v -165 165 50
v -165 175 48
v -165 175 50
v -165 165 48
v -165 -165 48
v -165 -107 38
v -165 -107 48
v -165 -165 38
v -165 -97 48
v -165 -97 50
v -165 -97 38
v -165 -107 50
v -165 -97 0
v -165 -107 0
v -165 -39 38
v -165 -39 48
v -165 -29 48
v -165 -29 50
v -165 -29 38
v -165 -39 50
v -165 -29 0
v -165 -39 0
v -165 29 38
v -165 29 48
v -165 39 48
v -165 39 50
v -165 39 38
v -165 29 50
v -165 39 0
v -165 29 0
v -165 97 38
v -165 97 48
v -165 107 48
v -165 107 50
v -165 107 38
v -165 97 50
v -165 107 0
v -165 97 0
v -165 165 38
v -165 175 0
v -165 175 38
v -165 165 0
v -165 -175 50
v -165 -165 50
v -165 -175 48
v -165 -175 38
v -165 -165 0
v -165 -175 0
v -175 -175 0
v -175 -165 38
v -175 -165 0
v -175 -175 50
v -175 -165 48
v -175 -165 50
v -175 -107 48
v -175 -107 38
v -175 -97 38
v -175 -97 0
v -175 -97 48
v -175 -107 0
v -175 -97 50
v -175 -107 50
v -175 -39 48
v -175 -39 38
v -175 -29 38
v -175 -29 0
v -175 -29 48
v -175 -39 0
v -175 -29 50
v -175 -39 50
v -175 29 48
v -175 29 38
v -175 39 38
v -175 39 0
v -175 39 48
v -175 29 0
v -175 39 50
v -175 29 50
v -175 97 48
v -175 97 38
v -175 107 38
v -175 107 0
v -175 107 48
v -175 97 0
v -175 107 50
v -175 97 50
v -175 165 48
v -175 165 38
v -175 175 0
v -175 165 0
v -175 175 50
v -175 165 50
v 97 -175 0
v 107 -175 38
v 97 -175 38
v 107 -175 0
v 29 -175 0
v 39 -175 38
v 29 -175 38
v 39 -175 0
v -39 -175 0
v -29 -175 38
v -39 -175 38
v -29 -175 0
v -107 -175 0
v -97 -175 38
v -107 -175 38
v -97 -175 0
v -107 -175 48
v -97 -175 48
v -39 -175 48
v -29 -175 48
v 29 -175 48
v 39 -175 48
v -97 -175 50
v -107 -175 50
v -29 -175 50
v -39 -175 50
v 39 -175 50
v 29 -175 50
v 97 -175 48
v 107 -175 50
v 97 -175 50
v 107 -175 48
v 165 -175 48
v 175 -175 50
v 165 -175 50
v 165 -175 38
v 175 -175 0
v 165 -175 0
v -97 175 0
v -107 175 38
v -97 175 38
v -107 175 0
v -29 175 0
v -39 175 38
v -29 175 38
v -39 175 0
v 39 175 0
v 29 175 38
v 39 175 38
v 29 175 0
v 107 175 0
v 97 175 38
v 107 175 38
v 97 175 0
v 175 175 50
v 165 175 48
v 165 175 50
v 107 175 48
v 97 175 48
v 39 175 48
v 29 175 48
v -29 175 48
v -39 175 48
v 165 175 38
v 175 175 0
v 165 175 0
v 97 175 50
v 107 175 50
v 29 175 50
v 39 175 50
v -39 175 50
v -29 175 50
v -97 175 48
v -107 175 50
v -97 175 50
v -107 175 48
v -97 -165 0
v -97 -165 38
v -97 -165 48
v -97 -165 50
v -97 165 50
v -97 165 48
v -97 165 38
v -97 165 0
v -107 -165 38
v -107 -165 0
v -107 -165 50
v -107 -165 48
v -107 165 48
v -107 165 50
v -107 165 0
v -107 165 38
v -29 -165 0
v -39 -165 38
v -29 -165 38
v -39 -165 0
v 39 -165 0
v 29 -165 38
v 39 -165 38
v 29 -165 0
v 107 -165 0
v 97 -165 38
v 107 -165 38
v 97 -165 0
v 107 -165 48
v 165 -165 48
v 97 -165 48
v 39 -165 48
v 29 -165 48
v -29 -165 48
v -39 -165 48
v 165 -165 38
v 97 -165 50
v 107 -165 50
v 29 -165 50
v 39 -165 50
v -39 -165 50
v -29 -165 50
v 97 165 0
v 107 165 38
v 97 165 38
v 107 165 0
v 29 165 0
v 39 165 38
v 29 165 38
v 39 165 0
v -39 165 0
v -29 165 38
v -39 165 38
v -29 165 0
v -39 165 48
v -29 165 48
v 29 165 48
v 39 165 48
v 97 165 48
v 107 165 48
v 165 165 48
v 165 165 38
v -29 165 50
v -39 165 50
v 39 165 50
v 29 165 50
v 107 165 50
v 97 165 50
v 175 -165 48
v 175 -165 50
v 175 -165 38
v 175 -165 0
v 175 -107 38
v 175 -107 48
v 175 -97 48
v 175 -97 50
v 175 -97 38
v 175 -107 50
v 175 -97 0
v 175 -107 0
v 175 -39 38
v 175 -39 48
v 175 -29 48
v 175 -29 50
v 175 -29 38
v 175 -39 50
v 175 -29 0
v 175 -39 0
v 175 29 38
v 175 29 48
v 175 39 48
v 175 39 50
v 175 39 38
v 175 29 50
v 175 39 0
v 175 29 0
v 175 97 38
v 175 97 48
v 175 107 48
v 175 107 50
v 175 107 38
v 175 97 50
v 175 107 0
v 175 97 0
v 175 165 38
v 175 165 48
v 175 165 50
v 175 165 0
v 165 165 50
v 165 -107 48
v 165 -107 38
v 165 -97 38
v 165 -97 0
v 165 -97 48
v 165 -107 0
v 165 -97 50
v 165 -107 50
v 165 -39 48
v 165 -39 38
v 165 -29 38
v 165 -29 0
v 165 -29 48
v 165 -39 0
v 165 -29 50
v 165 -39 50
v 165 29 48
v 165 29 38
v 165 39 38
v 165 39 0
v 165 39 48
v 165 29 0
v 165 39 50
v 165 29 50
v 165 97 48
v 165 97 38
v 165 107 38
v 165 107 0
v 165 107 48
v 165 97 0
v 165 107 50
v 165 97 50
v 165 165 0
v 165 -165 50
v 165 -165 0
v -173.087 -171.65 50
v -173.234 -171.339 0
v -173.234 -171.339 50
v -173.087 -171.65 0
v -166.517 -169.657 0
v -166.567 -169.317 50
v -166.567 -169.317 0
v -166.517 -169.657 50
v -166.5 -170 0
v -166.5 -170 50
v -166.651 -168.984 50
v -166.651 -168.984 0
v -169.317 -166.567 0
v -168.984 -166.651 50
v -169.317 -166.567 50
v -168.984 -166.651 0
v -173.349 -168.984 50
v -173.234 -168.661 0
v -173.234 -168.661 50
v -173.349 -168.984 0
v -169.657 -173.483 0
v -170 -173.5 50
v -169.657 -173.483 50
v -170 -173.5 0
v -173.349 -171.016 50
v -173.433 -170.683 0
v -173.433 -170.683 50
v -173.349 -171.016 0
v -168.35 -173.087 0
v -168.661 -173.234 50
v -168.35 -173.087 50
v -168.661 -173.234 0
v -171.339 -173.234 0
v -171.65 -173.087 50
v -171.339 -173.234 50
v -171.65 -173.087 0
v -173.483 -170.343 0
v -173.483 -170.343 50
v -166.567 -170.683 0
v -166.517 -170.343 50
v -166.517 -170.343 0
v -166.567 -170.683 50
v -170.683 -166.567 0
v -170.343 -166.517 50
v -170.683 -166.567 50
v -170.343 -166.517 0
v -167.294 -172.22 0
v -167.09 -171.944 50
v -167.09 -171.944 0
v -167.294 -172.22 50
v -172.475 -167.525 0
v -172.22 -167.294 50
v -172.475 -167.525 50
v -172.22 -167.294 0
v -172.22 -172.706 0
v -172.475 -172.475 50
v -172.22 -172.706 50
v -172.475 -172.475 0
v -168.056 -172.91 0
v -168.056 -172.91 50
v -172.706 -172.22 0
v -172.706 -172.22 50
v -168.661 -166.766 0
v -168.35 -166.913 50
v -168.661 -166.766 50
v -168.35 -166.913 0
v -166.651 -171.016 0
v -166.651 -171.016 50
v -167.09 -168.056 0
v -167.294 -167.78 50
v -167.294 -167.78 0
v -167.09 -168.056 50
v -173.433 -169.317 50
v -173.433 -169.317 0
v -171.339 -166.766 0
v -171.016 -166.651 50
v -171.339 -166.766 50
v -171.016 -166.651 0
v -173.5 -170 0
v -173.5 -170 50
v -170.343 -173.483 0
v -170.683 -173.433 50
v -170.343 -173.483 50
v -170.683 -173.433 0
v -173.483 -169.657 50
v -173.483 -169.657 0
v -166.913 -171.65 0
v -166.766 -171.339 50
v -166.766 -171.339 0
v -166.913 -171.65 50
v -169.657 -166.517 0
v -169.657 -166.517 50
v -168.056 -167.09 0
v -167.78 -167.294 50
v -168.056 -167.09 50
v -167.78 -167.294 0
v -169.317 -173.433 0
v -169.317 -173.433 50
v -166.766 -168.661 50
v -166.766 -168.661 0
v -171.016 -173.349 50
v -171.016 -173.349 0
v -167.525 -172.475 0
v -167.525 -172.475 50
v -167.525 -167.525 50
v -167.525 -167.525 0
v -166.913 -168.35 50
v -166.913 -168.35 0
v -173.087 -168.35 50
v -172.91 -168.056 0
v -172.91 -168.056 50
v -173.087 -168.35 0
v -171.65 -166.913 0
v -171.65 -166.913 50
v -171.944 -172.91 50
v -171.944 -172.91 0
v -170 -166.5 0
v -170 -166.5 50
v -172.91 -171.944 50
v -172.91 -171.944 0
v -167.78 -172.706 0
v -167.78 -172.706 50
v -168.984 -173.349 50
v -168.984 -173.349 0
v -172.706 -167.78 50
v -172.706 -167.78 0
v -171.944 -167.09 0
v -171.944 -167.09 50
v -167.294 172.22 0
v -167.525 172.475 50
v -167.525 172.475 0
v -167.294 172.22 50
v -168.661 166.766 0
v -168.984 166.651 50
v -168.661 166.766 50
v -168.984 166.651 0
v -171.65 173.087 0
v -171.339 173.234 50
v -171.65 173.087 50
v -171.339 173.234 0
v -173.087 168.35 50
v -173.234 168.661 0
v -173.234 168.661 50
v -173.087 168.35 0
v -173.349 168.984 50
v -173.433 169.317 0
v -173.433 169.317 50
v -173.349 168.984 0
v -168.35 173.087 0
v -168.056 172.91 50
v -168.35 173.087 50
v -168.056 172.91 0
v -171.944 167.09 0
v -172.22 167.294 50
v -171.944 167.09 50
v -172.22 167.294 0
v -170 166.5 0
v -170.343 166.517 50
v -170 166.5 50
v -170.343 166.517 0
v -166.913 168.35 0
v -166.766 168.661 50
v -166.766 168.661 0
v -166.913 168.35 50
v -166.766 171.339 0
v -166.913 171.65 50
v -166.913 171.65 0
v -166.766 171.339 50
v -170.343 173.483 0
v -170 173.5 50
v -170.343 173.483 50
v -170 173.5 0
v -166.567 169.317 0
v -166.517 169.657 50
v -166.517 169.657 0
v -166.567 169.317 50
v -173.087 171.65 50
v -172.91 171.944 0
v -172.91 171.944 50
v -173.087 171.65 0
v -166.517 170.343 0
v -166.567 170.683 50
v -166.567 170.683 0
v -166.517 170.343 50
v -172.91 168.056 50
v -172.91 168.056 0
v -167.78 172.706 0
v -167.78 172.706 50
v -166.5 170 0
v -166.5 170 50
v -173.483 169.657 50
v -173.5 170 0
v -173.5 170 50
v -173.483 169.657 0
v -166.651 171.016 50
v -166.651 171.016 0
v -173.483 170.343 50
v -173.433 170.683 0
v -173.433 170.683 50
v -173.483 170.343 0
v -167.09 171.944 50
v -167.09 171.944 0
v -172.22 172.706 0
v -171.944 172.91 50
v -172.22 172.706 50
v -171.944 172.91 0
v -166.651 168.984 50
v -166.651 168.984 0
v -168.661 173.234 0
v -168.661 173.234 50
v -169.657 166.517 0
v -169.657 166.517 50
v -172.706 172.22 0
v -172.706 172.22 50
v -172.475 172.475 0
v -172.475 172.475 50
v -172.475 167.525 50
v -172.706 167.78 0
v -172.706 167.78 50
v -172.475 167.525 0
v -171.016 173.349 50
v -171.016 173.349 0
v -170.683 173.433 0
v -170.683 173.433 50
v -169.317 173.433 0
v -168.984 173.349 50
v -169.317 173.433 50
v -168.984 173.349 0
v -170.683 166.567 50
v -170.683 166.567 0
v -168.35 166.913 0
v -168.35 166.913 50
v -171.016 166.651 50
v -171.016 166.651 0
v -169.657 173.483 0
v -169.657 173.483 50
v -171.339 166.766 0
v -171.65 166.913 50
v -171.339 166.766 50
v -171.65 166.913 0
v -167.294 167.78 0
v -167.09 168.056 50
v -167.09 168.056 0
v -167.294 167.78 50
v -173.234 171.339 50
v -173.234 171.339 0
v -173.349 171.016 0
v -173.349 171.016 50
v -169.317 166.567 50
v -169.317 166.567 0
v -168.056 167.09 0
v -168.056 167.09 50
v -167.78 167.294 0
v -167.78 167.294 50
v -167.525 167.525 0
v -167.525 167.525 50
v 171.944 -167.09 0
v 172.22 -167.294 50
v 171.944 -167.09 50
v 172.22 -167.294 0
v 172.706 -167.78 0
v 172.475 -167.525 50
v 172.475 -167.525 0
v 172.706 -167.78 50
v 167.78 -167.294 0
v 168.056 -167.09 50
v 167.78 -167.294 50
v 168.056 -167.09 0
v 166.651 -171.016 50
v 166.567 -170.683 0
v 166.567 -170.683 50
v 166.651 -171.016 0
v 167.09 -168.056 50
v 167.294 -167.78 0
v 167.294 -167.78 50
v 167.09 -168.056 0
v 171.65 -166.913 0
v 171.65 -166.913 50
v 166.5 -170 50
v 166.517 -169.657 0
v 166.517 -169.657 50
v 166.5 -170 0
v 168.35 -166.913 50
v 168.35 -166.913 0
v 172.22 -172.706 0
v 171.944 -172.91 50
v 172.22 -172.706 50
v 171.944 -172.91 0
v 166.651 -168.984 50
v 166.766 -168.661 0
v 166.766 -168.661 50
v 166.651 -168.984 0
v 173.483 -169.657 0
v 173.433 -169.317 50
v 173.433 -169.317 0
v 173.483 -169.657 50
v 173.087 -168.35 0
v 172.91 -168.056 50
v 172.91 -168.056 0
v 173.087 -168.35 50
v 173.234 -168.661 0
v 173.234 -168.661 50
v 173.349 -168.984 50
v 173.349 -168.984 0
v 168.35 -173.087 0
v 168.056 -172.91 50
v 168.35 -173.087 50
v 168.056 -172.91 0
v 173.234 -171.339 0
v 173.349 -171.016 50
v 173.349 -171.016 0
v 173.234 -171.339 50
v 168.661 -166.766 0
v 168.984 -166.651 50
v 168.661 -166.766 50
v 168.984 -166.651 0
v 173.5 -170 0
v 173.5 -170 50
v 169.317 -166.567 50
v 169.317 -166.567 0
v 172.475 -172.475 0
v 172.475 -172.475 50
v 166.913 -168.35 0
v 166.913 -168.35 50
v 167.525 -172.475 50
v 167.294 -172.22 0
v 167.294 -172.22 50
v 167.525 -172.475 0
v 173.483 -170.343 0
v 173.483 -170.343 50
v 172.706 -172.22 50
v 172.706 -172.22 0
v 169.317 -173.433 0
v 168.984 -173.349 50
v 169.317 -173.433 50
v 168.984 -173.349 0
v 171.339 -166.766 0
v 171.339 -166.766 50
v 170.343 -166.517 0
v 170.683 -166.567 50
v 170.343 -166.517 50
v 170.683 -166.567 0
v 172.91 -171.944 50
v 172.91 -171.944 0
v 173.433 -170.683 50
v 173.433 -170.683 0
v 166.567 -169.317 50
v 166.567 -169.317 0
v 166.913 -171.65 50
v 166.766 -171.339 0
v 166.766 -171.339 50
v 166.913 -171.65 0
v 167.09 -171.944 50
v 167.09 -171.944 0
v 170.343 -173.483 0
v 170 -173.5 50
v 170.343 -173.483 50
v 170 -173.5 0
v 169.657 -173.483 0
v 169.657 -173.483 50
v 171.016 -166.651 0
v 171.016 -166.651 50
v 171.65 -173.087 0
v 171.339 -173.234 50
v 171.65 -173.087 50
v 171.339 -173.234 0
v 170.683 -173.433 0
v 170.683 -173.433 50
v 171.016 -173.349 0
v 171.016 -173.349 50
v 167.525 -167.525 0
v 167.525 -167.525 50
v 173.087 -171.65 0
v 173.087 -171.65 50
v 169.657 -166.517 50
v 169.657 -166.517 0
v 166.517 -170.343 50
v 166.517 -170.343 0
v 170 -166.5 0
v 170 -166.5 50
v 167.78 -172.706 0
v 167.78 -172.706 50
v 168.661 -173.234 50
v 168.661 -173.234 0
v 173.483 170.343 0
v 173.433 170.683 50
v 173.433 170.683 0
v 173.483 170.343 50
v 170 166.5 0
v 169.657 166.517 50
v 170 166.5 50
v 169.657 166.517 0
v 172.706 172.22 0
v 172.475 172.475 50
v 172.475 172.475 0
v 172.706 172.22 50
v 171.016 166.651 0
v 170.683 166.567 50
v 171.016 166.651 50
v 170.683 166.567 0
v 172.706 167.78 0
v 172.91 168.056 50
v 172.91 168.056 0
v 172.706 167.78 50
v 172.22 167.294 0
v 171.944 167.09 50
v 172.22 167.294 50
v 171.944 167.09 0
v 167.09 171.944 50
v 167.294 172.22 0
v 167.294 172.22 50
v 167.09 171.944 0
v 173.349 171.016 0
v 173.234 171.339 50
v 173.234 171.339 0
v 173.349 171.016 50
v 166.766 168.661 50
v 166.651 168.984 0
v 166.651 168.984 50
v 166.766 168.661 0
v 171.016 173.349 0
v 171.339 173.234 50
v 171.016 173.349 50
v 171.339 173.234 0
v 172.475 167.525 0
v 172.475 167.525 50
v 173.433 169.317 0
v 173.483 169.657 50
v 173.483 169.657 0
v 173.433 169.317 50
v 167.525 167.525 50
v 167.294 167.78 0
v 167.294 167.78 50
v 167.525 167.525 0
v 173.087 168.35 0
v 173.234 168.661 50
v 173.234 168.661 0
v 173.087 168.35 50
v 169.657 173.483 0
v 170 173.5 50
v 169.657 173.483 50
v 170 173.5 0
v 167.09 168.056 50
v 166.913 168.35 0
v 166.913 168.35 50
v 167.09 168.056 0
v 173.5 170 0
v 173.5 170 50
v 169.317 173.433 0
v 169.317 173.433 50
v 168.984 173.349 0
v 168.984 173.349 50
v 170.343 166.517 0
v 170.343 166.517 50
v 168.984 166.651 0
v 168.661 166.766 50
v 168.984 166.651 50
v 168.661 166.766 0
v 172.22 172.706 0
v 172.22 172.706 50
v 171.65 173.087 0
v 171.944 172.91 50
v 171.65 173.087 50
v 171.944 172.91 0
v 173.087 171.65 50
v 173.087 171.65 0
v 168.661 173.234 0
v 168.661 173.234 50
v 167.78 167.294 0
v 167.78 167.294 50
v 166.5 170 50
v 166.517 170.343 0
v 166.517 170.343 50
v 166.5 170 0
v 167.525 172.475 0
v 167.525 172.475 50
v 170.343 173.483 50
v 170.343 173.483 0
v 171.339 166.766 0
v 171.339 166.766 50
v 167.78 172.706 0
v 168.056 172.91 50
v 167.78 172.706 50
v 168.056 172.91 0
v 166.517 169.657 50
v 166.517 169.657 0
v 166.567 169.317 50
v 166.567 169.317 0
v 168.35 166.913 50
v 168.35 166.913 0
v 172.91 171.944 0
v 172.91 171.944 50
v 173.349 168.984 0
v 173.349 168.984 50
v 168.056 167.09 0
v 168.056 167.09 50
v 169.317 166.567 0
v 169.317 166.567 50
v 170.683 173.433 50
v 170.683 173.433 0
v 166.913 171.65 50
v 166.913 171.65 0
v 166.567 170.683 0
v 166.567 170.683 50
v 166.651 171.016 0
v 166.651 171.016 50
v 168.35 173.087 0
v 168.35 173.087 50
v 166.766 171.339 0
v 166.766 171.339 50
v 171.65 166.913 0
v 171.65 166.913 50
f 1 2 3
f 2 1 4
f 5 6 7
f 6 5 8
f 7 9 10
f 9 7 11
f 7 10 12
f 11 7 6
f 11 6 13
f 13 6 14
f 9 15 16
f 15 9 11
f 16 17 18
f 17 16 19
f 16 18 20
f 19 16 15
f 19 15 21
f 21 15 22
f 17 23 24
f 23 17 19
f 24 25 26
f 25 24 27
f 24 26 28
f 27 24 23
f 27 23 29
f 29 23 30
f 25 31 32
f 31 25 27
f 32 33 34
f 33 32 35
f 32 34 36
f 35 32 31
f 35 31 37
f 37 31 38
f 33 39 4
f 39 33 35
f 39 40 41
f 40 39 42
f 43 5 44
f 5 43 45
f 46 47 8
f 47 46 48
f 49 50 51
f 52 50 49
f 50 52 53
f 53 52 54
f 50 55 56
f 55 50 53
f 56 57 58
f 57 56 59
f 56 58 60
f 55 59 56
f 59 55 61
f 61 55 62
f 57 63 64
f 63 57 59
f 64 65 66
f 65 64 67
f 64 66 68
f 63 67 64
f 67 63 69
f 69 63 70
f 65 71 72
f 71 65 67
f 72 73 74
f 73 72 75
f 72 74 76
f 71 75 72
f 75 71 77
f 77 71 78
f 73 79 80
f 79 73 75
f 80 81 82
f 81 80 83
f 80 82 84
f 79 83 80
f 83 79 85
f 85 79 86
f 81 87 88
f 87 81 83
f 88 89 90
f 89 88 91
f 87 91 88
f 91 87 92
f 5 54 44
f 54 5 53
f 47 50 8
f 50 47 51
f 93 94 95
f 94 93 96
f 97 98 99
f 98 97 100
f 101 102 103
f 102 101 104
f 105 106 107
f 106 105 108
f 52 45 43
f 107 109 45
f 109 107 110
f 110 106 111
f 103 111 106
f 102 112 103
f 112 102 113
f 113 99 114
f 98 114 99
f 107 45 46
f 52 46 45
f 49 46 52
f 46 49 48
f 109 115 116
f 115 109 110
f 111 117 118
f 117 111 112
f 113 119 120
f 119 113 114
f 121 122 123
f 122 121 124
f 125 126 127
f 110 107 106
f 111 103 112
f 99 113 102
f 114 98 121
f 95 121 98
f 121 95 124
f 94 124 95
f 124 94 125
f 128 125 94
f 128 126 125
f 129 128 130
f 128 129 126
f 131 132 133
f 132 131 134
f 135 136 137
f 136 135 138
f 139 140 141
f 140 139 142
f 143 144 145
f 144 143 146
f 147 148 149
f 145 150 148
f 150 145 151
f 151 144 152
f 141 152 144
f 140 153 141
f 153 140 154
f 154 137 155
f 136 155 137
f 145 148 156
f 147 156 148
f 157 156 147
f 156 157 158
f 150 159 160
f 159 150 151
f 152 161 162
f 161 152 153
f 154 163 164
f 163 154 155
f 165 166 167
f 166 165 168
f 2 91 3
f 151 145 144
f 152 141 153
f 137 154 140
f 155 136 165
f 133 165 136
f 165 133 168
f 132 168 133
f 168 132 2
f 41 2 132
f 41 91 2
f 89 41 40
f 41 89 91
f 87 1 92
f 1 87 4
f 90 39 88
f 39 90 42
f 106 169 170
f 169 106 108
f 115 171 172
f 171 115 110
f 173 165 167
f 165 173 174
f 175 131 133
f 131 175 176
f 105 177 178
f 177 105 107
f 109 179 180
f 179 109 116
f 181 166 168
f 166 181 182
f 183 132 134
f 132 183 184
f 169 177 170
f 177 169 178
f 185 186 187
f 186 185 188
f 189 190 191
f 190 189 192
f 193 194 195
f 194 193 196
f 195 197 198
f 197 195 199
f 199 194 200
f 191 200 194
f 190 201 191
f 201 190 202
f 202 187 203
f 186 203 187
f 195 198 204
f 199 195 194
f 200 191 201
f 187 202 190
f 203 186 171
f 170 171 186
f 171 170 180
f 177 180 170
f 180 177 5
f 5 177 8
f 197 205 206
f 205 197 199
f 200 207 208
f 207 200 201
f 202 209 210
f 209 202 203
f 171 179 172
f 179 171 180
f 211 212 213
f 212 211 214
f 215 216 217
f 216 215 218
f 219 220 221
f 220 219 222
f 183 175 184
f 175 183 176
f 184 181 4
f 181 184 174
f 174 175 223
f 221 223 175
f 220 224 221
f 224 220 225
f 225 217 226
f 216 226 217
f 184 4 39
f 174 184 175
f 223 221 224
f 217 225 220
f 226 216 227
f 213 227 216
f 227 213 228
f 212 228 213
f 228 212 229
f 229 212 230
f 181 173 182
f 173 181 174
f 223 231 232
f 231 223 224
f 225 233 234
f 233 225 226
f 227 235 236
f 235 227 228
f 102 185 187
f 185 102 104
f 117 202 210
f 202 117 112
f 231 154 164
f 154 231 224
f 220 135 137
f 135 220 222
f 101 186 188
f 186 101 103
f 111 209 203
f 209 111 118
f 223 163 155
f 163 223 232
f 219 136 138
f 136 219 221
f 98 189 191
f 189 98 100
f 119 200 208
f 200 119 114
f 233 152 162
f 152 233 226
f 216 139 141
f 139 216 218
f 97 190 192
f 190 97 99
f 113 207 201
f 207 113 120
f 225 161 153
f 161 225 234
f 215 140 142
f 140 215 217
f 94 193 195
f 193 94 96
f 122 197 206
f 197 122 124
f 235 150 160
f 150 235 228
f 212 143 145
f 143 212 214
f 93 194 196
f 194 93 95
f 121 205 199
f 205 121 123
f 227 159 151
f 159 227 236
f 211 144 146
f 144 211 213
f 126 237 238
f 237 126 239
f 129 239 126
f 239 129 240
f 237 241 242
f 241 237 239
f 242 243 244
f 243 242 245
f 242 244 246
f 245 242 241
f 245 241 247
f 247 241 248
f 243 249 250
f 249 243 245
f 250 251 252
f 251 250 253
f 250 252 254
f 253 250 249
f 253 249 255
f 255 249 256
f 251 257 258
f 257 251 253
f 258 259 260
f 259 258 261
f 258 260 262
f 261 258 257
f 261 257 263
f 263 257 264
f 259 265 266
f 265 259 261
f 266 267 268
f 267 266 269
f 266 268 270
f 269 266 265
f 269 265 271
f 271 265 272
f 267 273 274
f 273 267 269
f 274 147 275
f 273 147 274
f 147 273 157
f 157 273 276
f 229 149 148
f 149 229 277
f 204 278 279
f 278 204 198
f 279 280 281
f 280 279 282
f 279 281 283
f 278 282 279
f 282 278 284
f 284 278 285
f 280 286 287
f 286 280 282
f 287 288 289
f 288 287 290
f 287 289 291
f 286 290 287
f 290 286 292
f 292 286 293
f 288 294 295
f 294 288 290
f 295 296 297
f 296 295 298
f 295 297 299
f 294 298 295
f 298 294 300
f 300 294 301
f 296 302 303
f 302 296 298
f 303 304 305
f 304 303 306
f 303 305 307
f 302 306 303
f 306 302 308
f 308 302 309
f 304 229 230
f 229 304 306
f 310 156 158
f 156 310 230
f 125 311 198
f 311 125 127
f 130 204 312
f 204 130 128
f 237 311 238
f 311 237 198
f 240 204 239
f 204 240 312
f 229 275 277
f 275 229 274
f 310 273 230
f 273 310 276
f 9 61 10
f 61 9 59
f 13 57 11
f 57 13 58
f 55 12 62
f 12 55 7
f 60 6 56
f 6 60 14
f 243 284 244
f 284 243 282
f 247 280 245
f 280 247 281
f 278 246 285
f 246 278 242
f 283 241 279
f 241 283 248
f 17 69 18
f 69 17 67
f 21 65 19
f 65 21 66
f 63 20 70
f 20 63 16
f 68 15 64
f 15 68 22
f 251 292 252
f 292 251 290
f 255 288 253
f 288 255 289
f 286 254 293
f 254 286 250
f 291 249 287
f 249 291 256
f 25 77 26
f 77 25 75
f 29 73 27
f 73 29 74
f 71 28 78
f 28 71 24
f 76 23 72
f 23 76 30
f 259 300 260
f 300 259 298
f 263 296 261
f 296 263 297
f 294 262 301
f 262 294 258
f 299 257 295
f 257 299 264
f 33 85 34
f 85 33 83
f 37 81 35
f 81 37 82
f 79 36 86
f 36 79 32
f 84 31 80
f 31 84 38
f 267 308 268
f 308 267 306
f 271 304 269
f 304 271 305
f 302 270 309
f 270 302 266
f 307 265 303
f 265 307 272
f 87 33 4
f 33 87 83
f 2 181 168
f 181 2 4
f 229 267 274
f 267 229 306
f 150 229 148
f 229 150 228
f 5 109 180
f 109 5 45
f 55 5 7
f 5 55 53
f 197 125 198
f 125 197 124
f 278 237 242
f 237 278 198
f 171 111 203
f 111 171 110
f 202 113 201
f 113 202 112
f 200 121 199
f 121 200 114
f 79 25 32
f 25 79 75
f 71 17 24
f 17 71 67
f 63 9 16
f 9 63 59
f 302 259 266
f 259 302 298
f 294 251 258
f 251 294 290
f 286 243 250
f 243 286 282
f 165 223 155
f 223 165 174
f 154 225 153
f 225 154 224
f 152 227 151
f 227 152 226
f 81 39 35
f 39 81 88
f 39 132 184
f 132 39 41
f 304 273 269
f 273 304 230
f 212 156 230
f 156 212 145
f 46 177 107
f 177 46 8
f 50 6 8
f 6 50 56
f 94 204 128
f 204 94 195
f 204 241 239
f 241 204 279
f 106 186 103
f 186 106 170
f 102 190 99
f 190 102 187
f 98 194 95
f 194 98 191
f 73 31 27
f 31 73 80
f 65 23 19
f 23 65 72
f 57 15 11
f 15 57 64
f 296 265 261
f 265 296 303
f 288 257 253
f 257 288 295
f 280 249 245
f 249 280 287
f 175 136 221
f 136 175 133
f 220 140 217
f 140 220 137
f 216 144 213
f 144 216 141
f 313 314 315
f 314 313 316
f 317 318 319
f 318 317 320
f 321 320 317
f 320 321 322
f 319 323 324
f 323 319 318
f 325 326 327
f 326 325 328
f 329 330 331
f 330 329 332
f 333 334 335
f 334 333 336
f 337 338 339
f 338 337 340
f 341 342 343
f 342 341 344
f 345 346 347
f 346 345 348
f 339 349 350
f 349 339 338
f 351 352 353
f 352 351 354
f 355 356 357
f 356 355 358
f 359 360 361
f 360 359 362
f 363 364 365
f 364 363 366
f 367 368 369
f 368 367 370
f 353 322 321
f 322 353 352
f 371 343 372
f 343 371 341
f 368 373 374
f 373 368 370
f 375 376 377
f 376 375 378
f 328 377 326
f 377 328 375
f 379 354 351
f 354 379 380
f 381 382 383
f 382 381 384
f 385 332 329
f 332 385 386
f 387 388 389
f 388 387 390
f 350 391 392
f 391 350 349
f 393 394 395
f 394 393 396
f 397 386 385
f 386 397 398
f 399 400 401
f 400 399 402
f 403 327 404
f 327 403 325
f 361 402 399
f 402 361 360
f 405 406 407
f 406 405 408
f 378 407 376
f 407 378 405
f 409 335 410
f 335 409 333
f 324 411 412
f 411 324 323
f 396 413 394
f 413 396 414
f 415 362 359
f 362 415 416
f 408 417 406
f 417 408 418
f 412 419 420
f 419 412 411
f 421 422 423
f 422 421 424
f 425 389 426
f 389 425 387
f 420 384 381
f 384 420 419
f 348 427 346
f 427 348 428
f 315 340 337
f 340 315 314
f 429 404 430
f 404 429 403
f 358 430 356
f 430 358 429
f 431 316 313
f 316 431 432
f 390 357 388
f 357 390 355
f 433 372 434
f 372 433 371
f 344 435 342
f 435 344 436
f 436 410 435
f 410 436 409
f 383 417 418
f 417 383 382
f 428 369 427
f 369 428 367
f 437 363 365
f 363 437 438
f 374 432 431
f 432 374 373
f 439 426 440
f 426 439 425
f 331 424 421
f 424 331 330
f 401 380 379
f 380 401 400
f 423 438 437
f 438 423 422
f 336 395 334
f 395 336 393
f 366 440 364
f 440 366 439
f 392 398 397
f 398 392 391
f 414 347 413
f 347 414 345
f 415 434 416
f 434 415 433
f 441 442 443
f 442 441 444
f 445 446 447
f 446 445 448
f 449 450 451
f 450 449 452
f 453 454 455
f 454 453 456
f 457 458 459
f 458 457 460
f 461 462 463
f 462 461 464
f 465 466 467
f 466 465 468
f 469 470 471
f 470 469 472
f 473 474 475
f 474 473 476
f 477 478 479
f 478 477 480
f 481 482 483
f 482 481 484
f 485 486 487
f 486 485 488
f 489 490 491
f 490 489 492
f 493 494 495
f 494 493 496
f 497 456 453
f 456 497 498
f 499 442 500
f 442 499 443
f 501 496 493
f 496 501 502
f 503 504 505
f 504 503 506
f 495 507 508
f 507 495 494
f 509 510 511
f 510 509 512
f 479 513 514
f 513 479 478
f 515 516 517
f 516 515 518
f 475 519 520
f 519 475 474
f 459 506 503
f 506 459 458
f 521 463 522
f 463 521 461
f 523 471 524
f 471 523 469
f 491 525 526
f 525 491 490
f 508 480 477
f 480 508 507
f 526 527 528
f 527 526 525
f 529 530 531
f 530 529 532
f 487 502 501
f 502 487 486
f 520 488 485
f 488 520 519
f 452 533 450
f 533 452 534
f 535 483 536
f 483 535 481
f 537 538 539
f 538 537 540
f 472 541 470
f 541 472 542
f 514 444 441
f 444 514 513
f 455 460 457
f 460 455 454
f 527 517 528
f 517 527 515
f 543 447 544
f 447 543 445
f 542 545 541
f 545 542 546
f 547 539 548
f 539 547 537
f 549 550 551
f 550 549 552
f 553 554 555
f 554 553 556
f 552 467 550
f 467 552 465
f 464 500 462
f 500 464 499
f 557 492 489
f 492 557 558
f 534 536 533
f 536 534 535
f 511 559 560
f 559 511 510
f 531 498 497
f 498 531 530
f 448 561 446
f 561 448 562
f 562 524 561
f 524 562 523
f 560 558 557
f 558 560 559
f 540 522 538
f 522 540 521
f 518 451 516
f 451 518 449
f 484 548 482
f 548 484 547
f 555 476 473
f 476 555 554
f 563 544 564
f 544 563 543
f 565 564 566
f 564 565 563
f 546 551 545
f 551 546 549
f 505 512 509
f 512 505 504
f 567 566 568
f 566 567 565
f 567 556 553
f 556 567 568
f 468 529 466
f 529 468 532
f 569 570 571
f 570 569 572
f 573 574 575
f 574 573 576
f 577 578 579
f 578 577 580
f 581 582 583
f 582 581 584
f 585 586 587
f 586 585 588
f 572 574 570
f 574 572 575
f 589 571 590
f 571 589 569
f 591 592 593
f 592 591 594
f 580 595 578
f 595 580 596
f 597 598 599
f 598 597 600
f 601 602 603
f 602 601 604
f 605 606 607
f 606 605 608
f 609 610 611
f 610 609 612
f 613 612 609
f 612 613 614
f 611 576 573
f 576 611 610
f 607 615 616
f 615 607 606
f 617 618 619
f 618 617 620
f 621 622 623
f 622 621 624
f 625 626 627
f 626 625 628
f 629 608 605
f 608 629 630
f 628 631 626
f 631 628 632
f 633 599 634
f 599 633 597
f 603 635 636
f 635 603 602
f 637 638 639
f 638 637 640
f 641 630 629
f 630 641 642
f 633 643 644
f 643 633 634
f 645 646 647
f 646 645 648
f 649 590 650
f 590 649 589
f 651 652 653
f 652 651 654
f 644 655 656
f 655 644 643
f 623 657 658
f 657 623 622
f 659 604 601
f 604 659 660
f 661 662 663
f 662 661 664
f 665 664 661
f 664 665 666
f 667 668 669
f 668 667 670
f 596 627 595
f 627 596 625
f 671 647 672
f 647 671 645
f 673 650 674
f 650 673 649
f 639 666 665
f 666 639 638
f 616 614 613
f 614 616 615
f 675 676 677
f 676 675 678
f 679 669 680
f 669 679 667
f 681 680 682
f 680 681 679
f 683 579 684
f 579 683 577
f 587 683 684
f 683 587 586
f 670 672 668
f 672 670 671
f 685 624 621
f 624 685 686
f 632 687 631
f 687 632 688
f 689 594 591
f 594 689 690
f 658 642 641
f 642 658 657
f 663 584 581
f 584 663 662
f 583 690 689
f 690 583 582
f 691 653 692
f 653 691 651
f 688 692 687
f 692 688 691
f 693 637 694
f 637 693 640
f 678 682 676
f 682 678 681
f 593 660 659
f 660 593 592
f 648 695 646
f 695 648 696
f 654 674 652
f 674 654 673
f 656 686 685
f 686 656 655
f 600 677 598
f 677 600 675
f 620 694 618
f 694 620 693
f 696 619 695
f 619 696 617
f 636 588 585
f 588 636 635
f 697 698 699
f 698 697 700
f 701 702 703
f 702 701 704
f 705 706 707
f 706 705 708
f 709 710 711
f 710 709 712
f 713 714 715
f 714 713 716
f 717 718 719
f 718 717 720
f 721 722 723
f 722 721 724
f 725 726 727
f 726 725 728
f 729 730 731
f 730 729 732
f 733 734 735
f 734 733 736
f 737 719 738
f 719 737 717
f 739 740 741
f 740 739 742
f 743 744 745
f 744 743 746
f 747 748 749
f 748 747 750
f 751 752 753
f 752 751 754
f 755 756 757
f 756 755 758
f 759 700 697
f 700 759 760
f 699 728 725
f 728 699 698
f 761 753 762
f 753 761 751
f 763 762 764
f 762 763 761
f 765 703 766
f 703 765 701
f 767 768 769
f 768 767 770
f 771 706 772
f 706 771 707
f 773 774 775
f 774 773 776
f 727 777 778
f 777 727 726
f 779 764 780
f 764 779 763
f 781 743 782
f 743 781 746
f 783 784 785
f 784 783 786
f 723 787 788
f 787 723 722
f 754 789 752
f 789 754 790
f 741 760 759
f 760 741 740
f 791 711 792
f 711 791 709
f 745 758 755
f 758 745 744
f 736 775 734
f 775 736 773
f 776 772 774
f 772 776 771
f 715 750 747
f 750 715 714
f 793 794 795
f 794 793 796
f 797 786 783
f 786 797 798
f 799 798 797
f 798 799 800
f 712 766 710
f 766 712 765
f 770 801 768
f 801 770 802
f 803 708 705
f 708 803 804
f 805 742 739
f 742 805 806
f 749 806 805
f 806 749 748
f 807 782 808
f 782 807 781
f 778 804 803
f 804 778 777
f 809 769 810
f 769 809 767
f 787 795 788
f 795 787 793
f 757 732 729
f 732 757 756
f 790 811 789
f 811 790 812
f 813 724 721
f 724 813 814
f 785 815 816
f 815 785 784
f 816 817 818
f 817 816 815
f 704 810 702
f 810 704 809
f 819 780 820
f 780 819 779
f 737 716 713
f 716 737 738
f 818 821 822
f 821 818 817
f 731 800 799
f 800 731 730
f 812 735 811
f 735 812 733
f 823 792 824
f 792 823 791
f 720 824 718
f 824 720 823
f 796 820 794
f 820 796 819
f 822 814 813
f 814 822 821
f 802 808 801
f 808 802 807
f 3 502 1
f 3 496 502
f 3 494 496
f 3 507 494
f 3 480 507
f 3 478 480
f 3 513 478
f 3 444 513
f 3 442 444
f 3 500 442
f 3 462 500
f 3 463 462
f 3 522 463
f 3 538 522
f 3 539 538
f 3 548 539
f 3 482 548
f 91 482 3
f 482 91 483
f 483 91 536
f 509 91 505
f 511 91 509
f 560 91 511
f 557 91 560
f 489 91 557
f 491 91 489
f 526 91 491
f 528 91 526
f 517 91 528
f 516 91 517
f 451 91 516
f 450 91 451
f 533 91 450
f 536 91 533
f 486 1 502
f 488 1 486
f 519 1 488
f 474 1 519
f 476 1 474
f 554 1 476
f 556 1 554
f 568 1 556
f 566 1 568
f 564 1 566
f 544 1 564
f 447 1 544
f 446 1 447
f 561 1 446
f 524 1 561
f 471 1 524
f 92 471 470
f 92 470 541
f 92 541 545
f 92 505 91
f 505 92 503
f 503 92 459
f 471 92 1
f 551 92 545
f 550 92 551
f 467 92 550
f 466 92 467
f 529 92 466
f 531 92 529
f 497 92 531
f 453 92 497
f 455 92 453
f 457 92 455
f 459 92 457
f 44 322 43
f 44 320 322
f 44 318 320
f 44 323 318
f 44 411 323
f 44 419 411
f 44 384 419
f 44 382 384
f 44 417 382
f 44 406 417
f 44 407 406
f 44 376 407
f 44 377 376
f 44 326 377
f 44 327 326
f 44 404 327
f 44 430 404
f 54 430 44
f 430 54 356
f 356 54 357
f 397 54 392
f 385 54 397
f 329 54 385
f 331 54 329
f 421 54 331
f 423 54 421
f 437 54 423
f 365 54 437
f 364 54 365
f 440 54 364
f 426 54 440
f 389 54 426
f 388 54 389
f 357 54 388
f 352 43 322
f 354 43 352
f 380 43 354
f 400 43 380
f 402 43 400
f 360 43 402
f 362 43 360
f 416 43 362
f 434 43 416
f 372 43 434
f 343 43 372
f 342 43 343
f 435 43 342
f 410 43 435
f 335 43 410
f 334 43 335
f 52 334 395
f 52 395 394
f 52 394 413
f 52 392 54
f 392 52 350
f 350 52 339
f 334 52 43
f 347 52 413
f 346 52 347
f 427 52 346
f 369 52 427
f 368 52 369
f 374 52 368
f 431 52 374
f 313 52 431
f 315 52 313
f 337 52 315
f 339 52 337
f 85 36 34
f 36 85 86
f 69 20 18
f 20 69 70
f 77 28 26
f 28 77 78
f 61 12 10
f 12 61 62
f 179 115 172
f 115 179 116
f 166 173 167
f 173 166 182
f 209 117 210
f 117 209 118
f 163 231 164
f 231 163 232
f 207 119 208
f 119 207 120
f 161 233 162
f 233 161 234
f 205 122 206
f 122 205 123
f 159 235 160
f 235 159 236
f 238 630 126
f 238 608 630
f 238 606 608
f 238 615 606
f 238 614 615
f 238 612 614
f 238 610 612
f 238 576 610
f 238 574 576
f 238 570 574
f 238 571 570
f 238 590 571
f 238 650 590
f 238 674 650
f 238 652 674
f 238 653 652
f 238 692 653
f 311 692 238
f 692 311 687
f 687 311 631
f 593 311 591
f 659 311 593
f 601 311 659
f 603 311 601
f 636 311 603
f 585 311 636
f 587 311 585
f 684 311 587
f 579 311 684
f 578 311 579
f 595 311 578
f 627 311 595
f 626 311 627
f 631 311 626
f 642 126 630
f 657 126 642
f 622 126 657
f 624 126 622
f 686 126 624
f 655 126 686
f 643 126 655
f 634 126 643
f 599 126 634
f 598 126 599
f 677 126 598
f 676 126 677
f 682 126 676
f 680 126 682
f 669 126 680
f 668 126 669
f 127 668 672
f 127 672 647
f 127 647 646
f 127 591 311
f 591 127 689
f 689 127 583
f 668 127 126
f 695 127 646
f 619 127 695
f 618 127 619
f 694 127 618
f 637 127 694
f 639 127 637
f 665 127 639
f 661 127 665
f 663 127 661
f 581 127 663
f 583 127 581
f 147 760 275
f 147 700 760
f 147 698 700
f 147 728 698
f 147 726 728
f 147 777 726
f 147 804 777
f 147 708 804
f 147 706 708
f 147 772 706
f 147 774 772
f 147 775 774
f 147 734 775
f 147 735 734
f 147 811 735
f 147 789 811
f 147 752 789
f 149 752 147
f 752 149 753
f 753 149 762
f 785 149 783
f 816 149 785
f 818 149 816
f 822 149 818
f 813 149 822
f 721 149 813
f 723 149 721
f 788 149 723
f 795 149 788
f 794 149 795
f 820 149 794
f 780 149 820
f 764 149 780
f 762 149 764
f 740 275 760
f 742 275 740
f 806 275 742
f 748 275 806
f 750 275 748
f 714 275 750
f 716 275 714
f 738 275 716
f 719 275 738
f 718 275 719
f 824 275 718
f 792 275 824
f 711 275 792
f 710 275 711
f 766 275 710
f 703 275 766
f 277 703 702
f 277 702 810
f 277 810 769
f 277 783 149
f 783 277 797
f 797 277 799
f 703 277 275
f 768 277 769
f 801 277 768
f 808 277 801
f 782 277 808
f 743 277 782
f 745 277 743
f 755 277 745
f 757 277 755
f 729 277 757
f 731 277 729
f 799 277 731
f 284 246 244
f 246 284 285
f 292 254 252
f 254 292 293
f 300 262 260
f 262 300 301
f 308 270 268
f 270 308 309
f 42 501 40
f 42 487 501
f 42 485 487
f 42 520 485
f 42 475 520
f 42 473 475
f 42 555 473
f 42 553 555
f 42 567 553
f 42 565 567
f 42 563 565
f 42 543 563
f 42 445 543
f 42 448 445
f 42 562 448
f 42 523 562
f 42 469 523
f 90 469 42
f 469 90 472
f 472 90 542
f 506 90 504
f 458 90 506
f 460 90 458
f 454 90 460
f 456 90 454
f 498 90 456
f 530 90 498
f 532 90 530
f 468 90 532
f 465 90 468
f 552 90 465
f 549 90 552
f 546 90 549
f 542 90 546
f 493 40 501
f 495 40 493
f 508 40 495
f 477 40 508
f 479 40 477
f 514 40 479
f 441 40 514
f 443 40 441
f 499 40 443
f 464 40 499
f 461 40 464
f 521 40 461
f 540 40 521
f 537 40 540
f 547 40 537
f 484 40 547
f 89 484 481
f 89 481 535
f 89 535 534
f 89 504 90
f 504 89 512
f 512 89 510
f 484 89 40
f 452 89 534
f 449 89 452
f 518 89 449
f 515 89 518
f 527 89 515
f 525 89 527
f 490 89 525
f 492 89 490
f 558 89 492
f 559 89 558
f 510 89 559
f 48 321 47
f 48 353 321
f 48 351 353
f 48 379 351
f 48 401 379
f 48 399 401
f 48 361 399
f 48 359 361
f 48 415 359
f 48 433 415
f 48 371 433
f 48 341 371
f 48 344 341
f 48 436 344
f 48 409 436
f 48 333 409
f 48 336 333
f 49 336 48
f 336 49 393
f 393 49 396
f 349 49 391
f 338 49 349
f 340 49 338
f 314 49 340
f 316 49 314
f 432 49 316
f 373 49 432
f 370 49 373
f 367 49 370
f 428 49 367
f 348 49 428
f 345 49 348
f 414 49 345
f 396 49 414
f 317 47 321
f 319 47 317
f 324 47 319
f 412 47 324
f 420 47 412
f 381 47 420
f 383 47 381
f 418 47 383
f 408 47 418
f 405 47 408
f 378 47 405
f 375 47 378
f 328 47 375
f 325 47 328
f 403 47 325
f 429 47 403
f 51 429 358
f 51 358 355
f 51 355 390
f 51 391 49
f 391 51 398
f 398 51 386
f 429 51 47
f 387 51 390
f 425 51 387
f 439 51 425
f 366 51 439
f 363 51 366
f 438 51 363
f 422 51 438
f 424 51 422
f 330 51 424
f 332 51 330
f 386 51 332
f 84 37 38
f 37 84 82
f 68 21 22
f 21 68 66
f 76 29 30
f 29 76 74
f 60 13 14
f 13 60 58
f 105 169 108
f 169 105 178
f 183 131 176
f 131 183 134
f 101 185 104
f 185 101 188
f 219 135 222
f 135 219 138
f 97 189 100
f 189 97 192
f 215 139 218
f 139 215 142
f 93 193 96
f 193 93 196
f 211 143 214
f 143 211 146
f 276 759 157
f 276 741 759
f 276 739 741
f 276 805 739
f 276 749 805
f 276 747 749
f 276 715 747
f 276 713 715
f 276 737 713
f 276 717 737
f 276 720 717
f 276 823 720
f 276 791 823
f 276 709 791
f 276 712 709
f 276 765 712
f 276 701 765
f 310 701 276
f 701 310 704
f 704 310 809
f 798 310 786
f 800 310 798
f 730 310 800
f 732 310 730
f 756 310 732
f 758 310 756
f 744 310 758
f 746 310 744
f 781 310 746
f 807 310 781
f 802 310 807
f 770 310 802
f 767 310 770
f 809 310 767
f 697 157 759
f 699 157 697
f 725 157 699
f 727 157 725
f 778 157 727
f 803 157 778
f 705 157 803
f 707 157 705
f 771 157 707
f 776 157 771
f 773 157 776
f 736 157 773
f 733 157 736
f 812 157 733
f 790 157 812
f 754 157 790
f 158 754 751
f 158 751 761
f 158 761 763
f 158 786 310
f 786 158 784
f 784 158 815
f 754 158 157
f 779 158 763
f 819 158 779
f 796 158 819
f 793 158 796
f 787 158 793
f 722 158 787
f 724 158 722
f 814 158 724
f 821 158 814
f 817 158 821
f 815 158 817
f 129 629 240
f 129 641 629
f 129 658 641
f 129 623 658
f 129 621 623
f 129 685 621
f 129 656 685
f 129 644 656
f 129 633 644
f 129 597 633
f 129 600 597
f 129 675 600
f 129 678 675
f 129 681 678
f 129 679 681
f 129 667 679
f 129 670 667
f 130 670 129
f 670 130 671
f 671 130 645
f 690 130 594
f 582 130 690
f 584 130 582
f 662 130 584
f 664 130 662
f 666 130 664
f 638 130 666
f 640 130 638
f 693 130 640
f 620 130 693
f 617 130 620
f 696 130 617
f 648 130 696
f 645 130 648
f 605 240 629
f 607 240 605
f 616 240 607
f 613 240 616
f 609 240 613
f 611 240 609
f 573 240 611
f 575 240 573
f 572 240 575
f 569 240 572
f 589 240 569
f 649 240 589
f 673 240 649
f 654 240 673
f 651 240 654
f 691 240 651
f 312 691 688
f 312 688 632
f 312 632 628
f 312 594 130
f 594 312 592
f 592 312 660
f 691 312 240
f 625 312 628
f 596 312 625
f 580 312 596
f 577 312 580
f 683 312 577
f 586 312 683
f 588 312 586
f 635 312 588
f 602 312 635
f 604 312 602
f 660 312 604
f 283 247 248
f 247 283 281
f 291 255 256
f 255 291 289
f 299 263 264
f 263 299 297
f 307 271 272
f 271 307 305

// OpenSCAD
// Cage slice - index 2
bar = 10;
outer = 350;
half = outer / 2;
height = 700;

N_xy = 6;
N_z  = 11;

x_spacing = (outer - bar) / (N_xy - 1);
z_spacing = (height - bar) / (N_z  - 1);

xs = [ for (i = [0 : N_xy - 1]) (-half + bar/2 + i * x_spacing) ];
ys = xs;

zs = [ for (k = [0 : N_z - 1]) (bar/2 + k * z_spacing) ];

$fn = 64;

module cage_bars() {
    union() {
        // Vertical bars on front and back faces
        for (xv = xs) {
            translate([xv, -half + bar/2, height/2])
                cube([bar, bar, height], center = true);
            translate([xv,  half - bar/2, height/2])
                cube([bar, bar, height], center = true);
        }

        // Vertical bars on left and right faces
        for (yv = ys) {
            translate([-half + bar/2, yv, height/2])
                cube([bar, bar, height], center = true);
            translate([ half - bar/2, yv, height/2])
                cube([bar, bar, height], center = true);
        }

        // Horizontal x-bars on front and back faces
        for (zv = zs) {
            translate([0, -half + bar/2, zv])
                cube([outer, bar, bar], center = true);
            translate([0,  half - bar/2, zv])
                cube([outer, bar, bar], center = true);
        }

        // Horizontal y-bars on left and right faces
        for (zv = zs) {
            translate([-half + bar/2, 0, zv])
                cube([bar, outer, bar], center = true);
            translate([ half - bar/2, 0, zv])
                cube([bar, outer, bar], center = true);
        }

        // Floor and ceiling extra x-bars at all y positions
        z_floor = bar/2;
        z_ceil  = height - bar/2;
        for (yv = ys) {
            translate([0, yv, z_floor])
                cube([outer, bar, bar], center = true);
            translate([0, yv, z_ceil])
                cube([outer, bar, bar], center = true);
        }

        // Floor and ceiling extra y-bars at all x positions
        for (xv = xs) {
            translate([xv, 0, z_floor])
                cube([bar, outer, bar], center = true);
            translate([xv, 0, z_ceil])
                cube([bar, outer, bar], center = true);
        }
    }
}

module corner_holes() {
    hole_d = 7;
    for (sx = [-1, 1])
        for (sy = [-1, 1])
            translate([sx * (half - bar/2), sy * (half - bar/2), height/2])
                cylinder(h = height + 2, d = hole_d, center = true);
}

module cage_full() {
    difference() {
        cage_bars();
        corner_holes();
    }
}

slice_index = 2;
slice_height = 50;

module cage_slice() {
    translate([0, 0, -slice_index * slice_height]) {
        intersection() {
            cage_full();
            translate([0, 0, slice_index * slice_height + slice_height/2])
                cube([outer + 20, outer + 20, slice_height], center = true);
        }
    }
}

cage_slice();
